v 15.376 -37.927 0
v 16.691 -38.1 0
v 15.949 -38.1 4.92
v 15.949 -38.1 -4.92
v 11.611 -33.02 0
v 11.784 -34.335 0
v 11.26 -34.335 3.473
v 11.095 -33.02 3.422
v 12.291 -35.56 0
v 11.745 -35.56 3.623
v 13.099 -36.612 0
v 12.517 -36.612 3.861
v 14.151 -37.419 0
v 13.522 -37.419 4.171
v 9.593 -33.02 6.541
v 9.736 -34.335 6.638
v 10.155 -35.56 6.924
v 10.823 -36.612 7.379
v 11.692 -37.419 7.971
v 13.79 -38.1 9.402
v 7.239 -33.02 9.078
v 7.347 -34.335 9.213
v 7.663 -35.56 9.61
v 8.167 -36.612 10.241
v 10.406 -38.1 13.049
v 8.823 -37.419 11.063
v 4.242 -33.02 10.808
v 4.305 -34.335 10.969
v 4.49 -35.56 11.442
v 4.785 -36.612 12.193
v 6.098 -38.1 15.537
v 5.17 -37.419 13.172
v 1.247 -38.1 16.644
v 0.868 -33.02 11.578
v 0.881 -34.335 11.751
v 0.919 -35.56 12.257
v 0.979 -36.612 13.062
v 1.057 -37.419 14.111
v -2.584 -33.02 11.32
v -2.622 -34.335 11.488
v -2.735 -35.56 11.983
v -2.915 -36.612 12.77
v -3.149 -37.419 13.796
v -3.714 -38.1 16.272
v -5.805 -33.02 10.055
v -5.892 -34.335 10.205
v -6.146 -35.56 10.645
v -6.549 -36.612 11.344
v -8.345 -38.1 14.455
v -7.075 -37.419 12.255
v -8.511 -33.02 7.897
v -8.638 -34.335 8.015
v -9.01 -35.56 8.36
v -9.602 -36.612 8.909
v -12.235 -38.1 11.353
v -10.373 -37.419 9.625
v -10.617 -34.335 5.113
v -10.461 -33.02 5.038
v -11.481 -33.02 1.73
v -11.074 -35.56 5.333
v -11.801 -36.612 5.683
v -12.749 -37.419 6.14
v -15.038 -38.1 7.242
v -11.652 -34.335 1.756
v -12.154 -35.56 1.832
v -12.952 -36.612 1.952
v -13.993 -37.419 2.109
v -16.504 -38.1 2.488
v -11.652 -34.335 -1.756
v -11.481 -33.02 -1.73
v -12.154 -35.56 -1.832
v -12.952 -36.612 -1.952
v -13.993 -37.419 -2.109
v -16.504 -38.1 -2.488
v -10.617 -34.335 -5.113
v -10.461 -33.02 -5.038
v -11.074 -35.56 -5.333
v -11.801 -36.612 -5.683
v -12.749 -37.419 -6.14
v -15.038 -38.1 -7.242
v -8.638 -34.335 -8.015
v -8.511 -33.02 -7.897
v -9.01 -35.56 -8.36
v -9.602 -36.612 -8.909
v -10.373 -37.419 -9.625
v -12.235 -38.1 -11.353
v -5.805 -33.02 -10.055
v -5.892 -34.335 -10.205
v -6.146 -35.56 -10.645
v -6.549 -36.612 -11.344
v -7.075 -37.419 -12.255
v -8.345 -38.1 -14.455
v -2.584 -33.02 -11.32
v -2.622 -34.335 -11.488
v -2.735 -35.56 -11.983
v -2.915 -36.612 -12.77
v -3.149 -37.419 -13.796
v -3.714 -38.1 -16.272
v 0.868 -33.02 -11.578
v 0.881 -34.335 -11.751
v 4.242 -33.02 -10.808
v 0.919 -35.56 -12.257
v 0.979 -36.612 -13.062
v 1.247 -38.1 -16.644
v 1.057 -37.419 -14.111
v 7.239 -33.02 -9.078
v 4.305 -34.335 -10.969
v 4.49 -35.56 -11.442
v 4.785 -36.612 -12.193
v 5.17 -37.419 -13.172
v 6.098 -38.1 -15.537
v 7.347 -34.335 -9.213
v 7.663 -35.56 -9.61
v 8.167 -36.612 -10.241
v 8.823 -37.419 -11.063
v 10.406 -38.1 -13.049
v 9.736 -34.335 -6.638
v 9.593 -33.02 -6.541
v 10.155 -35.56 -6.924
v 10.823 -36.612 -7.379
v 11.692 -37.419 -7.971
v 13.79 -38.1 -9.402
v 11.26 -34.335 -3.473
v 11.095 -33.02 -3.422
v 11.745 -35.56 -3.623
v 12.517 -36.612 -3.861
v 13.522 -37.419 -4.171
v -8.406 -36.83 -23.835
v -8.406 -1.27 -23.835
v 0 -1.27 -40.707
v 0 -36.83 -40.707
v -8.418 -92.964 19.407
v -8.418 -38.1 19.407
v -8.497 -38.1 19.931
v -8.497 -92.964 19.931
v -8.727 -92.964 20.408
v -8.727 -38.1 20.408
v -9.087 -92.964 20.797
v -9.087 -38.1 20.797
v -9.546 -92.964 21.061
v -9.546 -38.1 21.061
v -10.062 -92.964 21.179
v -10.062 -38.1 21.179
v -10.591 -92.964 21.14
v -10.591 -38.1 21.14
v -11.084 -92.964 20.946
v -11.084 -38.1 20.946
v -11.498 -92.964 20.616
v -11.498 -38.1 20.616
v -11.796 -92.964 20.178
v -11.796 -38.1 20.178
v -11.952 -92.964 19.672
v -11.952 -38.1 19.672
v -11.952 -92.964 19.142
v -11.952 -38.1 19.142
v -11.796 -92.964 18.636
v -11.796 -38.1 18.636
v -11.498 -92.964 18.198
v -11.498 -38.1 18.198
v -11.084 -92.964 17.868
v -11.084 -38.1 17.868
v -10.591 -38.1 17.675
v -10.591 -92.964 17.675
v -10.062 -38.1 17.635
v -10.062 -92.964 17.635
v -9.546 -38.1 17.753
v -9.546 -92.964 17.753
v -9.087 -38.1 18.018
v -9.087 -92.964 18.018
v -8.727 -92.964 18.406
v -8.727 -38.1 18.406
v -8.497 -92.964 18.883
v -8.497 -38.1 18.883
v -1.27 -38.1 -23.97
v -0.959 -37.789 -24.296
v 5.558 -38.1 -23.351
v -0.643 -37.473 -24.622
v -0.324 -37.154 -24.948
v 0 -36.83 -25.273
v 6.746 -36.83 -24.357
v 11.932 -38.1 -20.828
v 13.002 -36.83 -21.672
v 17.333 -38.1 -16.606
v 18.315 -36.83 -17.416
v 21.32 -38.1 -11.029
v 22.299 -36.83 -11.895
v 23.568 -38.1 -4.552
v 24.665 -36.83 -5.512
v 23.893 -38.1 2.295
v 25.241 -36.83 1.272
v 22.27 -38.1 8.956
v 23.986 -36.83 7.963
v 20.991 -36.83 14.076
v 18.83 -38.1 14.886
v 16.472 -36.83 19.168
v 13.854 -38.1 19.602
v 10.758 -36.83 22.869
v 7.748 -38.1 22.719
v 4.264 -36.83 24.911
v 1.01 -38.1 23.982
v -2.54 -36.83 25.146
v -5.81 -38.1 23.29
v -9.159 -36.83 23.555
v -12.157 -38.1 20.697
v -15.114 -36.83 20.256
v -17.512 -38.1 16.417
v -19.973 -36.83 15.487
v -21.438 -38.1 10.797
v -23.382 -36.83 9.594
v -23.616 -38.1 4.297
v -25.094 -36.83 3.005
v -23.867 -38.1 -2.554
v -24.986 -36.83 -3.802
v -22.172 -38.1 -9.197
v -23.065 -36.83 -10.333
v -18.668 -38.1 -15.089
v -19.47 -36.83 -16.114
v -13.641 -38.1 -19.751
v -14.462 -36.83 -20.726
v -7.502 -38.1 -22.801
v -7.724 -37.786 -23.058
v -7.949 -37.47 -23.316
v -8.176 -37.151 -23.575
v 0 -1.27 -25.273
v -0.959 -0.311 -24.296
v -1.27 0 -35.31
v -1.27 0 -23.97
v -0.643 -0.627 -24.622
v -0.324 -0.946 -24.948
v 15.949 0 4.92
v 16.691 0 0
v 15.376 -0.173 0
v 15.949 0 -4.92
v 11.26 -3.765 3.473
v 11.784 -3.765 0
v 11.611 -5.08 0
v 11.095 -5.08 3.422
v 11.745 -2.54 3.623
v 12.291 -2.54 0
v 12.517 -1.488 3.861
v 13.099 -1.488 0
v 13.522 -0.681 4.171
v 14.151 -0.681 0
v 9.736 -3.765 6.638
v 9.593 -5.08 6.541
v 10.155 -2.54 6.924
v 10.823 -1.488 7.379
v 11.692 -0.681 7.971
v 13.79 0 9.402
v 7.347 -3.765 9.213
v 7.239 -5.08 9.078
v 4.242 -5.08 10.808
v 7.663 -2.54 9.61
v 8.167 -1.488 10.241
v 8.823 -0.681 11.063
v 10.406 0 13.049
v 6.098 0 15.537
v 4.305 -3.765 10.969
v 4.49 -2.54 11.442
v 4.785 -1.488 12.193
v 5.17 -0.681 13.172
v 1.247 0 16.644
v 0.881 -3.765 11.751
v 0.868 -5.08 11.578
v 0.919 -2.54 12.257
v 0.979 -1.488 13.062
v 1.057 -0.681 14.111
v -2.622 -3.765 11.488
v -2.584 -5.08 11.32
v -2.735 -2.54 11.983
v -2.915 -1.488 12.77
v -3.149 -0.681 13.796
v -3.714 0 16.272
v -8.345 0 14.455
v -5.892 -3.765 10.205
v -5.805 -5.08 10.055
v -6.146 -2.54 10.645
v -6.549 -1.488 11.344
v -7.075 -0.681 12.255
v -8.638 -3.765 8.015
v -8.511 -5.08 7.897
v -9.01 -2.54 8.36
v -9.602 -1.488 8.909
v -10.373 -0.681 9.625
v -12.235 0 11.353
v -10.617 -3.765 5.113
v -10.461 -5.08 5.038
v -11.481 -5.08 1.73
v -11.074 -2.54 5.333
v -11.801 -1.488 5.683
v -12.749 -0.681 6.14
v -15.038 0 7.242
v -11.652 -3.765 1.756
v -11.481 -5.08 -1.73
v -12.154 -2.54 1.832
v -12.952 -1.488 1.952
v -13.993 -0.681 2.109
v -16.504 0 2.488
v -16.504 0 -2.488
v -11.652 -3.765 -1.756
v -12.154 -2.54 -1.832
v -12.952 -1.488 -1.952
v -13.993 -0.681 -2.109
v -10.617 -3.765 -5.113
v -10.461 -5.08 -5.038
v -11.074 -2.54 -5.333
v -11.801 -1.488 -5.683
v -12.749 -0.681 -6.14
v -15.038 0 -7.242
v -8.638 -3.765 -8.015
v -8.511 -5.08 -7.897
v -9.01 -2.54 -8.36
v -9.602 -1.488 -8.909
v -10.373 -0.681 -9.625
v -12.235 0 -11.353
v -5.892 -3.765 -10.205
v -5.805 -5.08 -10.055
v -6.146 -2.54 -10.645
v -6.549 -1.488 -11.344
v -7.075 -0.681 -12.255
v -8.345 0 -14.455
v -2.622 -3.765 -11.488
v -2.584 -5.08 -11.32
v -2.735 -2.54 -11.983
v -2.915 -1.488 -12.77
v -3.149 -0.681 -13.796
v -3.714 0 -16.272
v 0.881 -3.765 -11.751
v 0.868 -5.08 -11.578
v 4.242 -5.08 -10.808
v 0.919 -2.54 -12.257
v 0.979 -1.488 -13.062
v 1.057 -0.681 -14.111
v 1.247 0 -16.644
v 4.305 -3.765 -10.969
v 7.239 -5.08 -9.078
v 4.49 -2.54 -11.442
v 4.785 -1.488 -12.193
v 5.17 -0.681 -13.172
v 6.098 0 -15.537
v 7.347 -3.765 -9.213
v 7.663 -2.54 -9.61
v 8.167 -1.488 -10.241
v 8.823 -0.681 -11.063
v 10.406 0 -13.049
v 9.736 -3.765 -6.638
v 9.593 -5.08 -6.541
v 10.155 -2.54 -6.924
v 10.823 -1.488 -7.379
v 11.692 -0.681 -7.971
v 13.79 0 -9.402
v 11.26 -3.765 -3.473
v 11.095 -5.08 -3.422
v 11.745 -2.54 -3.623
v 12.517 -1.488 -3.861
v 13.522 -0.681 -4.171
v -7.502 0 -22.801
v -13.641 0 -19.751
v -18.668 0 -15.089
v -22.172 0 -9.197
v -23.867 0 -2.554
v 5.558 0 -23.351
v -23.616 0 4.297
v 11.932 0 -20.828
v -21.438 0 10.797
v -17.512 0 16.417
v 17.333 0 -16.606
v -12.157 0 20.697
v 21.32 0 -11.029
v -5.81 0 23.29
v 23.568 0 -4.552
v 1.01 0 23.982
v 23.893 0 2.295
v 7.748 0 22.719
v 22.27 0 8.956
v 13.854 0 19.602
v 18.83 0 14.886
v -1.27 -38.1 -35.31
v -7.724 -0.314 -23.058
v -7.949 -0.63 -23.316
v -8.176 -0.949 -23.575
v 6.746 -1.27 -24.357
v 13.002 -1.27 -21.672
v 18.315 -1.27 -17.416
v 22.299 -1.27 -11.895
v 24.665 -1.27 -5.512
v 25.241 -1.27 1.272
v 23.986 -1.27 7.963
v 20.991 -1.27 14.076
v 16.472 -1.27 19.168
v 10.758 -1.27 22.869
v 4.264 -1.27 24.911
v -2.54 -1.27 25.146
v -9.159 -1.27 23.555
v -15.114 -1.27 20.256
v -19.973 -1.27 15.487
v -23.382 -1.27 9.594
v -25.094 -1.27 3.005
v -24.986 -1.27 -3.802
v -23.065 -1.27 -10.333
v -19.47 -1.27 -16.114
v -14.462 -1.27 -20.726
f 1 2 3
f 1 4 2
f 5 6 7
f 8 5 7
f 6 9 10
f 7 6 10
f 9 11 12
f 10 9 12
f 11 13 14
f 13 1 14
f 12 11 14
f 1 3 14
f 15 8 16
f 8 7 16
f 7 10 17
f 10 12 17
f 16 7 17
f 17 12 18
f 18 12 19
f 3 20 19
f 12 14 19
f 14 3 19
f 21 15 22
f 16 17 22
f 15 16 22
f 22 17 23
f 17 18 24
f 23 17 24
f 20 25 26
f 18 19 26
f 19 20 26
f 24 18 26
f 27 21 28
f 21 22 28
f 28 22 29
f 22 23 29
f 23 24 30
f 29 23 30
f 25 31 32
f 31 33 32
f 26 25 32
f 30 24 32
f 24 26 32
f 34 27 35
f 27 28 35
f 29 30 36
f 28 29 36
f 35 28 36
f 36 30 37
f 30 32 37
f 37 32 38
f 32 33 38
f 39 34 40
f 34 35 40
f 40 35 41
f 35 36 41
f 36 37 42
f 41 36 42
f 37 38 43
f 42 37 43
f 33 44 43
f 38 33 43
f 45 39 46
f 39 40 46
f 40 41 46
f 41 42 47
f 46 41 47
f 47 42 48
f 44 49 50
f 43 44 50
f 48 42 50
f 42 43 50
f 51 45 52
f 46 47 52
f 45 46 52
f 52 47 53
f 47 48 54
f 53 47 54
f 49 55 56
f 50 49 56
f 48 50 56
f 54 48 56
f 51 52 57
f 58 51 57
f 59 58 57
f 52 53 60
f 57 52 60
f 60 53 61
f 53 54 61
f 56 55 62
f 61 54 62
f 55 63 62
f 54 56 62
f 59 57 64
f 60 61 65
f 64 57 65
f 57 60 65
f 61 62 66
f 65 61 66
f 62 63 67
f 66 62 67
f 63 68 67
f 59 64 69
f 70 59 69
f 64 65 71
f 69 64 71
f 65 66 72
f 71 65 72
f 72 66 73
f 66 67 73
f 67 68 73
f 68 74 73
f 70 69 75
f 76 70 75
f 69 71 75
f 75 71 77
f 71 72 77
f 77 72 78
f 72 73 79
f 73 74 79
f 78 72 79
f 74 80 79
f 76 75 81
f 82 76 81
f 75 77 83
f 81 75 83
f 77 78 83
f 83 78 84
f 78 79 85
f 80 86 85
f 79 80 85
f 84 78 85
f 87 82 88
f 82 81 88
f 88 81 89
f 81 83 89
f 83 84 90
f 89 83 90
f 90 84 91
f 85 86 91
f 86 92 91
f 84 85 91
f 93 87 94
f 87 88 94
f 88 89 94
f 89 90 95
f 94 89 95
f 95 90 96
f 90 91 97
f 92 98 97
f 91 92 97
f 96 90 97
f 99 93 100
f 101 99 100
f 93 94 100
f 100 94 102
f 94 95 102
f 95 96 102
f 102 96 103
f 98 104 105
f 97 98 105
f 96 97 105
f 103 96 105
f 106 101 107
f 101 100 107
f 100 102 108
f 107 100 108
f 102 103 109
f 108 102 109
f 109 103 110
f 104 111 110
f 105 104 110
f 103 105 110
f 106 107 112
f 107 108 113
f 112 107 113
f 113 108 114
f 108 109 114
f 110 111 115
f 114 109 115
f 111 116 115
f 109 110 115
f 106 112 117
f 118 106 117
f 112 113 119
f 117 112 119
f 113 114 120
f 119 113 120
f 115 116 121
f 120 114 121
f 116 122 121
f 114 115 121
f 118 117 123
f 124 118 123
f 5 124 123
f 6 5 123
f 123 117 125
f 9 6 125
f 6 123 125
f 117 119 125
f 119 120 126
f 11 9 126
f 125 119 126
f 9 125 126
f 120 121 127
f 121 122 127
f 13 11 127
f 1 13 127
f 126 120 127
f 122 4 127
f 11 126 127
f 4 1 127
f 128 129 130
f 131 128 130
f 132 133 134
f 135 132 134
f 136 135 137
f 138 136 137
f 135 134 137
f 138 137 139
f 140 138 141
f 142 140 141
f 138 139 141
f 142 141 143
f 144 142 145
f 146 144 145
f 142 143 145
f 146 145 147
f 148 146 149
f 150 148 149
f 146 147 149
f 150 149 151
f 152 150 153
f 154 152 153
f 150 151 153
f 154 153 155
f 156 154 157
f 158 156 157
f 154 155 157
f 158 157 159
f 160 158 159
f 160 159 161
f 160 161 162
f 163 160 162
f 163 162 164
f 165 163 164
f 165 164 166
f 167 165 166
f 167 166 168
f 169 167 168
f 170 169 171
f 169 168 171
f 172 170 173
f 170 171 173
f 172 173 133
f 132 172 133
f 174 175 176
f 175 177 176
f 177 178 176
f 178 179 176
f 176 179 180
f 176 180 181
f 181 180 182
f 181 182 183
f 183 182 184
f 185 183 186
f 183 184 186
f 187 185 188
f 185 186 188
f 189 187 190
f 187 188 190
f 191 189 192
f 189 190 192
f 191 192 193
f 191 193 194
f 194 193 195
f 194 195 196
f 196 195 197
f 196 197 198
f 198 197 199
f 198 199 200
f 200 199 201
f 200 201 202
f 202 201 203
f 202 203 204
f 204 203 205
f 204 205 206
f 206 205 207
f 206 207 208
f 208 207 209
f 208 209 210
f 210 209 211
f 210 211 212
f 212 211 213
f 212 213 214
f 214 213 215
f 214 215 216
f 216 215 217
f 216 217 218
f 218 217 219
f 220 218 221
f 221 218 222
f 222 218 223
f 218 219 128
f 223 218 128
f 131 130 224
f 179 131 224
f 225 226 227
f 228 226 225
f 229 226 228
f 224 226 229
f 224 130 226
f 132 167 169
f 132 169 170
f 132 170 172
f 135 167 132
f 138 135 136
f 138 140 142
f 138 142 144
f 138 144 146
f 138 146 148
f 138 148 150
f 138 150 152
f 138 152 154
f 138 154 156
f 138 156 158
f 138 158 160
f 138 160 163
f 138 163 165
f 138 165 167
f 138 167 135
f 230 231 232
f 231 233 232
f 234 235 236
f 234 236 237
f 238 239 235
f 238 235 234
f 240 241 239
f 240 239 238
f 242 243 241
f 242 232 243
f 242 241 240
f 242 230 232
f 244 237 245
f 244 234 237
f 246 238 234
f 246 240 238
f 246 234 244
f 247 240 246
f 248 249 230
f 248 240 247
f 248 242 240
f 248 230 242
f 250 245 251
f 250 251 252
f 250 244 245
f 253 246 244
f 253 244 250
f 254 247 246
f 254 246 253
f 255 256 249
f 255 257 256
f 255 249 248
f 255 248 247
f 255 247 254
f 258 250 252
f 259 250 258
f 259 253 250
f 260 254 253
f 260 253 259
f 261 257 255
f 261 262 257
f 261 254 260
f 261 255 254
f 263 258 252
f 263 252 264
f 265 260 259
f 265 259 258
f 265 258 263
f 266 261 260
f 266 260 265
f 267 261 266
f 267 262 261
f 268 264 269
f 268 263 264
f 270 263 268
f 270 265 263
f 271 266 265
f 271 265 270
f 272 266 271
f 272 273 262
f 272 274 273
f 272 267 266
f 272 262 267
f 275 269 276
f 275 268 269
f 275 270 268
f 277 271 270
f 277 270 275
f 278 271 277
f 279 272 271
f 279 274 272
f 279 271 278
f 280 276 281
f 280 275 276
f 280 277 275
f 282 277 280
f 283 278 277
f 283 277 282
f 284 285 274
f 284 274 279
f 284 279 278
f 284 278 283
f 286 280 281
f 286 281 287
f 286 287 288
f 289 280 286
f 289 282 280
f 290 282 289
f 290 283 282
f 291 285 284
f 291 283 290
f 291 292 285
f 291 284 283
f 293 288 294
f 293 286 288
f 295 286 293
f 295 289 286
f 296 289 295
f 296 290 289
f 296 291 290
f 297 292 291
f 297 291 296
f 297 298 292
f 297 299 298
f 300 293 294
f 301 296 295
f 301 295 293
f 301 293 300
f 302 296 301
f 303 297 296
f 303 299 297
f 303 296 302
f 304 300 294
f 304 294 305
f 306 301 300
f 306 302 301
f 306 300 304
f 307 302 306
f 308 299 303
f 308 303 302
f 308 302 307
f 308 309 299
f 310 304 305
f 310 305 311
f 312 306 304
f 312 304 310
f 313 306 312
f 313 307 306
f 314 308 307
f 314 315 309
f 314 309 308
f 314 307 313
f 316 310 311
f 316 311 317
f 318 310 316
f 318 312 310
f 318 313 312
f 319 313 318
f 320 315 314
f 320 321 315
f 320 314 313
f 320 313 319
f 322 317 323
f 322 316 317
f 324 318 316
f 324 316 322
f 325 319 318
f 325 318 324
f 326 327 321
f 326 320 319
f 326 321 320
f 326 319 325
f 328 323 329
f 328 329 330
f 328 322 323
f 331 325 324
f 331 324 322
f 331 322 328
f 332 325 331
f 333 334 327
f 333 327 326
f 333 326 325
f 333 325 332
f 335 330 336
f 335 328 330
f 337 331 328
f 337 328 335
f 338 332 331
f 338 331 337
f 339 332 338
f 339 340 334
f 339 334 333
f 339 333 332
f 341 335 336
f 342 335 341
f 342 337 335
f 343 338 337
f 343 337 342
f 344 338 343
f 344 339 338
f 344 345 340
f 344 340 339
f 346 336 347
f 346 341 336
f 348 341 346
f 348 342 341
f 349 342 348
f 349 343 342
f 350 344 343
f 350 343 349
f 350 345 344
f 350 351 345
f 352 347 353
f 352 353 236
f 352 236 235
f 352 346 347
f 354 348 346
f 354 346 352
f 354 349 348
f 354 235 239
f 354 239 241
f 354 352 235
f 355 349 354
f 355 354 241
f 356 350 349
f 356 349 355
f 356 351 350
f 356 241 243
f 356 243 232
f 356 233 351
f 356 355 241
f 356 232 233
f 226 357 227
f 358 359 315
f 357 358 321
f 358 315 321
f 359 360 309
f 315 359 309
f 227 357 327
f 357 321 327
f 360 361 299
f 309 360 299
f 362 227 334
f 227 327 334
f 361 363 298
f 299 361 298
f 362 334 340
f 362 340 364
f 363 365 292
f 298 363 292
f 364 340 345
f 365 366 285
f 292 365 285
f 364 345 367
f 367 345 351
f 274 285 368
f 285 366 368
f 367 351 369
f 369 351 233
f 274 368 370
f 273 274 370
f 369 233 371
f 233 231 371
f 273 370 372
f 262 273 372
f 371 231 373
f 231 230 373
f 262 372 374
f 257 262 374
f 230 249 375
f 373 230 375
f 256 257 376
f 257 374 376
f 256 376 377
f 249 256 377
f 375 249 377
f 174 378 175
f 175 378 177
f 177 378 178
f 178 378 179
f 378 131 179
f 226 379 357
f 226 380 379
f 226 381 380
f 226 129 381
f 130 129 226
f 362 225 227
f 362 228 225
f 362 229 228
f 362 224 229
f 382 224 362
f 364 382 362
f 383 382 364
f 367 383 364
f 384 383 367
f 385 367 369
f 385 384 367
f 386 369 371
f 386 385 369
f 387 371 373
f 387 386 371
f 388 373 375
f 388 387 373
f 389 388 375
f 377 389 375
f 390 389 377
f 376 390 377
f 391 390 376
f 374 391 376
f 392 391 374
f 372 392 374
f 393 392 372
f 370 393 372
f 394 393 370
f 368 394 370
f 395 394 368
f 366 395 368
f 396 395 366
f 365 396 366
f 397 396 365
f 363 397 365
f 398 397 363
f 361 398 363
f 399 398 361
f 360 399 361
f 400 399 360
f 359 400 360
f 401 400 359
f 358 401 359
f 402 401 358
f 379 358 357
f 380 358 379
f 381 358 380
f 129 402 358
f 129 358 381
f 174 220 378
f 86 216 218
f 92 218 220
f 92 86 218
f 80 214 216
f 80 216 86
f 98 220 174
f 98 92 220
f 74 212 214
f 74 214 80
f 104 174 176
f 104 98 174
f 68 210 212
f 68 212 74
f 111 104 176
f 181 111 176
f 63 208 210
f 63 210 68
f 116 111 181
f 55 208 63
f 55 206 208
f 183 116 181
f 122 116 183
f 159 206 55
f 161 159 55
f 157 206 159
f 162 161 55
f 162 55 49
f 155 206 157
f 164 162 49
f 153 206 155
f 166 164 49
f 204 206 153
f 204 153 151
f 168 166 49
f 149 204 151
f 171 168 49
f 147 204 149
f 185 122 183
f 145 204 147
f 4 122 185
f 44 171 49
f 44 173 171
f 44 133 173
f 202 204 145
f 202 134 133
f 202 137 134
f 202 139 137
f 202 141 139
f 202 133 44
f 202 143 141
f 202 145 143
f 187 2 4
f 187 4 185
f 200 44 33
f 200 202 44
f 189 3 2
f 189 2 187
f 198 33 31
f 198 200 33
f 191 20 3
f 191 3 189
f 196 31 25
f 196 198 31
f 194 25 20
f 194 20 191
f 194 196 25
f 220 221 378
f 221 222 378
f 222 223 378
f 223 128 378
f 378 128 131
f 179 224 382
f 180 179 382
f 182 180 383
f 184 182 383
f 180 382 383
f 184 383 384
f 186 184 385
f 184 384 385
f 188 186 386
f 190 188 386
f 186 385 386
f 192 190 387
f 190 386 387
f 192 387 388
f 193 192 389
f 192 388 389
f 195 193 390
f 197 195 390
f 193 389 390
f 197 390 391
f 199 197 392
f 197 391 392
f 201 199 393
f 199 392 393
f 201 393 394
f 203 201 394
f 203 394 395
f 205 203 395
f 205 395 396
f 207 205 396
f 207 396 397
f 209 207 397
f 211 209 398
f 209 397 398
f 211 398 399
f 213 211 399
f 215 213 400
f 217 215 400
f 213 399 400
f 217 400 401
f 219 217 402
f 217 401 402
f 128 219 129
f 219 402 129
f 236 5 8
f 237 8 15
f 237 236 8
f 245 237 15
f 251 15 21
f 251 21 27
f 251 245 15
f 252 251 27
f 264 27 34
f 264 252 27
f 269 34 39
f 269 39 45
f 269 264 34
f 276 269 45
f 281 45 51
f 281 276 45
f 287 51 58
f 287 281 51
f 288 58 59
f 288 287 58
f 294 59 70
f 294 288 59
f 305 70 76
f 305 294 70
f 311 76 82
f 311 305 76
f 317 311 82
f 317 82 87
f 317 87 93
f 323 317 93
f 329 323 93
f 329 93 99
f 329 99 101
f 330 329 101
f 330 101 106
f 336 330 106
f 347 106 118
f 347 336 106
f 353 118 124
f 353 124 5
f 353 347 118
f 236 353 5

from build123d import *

# Parameters (mm, degrees)
F0_R     = 11.61063
F1_DEPTH = 38.1
F2_R     = 5.08
F3_SIZE  = 1.27
F5_R     = 1.777125
F6_DEPTH = 54.864


with BuildPart() as f1:
    # F0 (on Front) → F1 (new body)
    with BuildSketch(Plane.XZ):
        with BuildLine():
            Line((0, -40.706848), (0, -25.273476))
            ThreePointArc((0, -25.273476), (4.263921, 24.911194), (-8.405601, -23.834733))
            Line((-8.405601, -23.834733), (0, -40.706848))
        make_face()
        Circle(F0_R, mode=Mode.SUBTRACT)
    extrude(amount=F1_DEPTH)

    # F2
    f2_edges = [f1.edges().sort_by_distance(p)[0] for p in [
        (-11.61063, 0, 0),
        (-11.61063, -38.1, 0),
    ]]
    fillet(f2_edges, radius=F2_R)

    # F3
    f3_edges = [f1.edges().sort_by_distance(p)[0] for p in [
        (4.263921, -38.1, 24.911194),
        (0, -38.1, -32.990162),
        (4.263921, 0, 24.911194),
        (0, 0, -32.990162),
        (-4.2028, 0, -32.27079),
        (-4.2028, -38.1, -32.27079),
    ]]
    chamfer(f3_edges, length=F3_SIZE)

    # F5 (on face) → F6 (join)
    with BuildSketch(Plane.XZ.offset(38.1)):
        with Locations((-10.195103, 19.407116)):
            Circle(F5_R)
    extrude(amount=F6_DEPTH)


solid = f1.part
